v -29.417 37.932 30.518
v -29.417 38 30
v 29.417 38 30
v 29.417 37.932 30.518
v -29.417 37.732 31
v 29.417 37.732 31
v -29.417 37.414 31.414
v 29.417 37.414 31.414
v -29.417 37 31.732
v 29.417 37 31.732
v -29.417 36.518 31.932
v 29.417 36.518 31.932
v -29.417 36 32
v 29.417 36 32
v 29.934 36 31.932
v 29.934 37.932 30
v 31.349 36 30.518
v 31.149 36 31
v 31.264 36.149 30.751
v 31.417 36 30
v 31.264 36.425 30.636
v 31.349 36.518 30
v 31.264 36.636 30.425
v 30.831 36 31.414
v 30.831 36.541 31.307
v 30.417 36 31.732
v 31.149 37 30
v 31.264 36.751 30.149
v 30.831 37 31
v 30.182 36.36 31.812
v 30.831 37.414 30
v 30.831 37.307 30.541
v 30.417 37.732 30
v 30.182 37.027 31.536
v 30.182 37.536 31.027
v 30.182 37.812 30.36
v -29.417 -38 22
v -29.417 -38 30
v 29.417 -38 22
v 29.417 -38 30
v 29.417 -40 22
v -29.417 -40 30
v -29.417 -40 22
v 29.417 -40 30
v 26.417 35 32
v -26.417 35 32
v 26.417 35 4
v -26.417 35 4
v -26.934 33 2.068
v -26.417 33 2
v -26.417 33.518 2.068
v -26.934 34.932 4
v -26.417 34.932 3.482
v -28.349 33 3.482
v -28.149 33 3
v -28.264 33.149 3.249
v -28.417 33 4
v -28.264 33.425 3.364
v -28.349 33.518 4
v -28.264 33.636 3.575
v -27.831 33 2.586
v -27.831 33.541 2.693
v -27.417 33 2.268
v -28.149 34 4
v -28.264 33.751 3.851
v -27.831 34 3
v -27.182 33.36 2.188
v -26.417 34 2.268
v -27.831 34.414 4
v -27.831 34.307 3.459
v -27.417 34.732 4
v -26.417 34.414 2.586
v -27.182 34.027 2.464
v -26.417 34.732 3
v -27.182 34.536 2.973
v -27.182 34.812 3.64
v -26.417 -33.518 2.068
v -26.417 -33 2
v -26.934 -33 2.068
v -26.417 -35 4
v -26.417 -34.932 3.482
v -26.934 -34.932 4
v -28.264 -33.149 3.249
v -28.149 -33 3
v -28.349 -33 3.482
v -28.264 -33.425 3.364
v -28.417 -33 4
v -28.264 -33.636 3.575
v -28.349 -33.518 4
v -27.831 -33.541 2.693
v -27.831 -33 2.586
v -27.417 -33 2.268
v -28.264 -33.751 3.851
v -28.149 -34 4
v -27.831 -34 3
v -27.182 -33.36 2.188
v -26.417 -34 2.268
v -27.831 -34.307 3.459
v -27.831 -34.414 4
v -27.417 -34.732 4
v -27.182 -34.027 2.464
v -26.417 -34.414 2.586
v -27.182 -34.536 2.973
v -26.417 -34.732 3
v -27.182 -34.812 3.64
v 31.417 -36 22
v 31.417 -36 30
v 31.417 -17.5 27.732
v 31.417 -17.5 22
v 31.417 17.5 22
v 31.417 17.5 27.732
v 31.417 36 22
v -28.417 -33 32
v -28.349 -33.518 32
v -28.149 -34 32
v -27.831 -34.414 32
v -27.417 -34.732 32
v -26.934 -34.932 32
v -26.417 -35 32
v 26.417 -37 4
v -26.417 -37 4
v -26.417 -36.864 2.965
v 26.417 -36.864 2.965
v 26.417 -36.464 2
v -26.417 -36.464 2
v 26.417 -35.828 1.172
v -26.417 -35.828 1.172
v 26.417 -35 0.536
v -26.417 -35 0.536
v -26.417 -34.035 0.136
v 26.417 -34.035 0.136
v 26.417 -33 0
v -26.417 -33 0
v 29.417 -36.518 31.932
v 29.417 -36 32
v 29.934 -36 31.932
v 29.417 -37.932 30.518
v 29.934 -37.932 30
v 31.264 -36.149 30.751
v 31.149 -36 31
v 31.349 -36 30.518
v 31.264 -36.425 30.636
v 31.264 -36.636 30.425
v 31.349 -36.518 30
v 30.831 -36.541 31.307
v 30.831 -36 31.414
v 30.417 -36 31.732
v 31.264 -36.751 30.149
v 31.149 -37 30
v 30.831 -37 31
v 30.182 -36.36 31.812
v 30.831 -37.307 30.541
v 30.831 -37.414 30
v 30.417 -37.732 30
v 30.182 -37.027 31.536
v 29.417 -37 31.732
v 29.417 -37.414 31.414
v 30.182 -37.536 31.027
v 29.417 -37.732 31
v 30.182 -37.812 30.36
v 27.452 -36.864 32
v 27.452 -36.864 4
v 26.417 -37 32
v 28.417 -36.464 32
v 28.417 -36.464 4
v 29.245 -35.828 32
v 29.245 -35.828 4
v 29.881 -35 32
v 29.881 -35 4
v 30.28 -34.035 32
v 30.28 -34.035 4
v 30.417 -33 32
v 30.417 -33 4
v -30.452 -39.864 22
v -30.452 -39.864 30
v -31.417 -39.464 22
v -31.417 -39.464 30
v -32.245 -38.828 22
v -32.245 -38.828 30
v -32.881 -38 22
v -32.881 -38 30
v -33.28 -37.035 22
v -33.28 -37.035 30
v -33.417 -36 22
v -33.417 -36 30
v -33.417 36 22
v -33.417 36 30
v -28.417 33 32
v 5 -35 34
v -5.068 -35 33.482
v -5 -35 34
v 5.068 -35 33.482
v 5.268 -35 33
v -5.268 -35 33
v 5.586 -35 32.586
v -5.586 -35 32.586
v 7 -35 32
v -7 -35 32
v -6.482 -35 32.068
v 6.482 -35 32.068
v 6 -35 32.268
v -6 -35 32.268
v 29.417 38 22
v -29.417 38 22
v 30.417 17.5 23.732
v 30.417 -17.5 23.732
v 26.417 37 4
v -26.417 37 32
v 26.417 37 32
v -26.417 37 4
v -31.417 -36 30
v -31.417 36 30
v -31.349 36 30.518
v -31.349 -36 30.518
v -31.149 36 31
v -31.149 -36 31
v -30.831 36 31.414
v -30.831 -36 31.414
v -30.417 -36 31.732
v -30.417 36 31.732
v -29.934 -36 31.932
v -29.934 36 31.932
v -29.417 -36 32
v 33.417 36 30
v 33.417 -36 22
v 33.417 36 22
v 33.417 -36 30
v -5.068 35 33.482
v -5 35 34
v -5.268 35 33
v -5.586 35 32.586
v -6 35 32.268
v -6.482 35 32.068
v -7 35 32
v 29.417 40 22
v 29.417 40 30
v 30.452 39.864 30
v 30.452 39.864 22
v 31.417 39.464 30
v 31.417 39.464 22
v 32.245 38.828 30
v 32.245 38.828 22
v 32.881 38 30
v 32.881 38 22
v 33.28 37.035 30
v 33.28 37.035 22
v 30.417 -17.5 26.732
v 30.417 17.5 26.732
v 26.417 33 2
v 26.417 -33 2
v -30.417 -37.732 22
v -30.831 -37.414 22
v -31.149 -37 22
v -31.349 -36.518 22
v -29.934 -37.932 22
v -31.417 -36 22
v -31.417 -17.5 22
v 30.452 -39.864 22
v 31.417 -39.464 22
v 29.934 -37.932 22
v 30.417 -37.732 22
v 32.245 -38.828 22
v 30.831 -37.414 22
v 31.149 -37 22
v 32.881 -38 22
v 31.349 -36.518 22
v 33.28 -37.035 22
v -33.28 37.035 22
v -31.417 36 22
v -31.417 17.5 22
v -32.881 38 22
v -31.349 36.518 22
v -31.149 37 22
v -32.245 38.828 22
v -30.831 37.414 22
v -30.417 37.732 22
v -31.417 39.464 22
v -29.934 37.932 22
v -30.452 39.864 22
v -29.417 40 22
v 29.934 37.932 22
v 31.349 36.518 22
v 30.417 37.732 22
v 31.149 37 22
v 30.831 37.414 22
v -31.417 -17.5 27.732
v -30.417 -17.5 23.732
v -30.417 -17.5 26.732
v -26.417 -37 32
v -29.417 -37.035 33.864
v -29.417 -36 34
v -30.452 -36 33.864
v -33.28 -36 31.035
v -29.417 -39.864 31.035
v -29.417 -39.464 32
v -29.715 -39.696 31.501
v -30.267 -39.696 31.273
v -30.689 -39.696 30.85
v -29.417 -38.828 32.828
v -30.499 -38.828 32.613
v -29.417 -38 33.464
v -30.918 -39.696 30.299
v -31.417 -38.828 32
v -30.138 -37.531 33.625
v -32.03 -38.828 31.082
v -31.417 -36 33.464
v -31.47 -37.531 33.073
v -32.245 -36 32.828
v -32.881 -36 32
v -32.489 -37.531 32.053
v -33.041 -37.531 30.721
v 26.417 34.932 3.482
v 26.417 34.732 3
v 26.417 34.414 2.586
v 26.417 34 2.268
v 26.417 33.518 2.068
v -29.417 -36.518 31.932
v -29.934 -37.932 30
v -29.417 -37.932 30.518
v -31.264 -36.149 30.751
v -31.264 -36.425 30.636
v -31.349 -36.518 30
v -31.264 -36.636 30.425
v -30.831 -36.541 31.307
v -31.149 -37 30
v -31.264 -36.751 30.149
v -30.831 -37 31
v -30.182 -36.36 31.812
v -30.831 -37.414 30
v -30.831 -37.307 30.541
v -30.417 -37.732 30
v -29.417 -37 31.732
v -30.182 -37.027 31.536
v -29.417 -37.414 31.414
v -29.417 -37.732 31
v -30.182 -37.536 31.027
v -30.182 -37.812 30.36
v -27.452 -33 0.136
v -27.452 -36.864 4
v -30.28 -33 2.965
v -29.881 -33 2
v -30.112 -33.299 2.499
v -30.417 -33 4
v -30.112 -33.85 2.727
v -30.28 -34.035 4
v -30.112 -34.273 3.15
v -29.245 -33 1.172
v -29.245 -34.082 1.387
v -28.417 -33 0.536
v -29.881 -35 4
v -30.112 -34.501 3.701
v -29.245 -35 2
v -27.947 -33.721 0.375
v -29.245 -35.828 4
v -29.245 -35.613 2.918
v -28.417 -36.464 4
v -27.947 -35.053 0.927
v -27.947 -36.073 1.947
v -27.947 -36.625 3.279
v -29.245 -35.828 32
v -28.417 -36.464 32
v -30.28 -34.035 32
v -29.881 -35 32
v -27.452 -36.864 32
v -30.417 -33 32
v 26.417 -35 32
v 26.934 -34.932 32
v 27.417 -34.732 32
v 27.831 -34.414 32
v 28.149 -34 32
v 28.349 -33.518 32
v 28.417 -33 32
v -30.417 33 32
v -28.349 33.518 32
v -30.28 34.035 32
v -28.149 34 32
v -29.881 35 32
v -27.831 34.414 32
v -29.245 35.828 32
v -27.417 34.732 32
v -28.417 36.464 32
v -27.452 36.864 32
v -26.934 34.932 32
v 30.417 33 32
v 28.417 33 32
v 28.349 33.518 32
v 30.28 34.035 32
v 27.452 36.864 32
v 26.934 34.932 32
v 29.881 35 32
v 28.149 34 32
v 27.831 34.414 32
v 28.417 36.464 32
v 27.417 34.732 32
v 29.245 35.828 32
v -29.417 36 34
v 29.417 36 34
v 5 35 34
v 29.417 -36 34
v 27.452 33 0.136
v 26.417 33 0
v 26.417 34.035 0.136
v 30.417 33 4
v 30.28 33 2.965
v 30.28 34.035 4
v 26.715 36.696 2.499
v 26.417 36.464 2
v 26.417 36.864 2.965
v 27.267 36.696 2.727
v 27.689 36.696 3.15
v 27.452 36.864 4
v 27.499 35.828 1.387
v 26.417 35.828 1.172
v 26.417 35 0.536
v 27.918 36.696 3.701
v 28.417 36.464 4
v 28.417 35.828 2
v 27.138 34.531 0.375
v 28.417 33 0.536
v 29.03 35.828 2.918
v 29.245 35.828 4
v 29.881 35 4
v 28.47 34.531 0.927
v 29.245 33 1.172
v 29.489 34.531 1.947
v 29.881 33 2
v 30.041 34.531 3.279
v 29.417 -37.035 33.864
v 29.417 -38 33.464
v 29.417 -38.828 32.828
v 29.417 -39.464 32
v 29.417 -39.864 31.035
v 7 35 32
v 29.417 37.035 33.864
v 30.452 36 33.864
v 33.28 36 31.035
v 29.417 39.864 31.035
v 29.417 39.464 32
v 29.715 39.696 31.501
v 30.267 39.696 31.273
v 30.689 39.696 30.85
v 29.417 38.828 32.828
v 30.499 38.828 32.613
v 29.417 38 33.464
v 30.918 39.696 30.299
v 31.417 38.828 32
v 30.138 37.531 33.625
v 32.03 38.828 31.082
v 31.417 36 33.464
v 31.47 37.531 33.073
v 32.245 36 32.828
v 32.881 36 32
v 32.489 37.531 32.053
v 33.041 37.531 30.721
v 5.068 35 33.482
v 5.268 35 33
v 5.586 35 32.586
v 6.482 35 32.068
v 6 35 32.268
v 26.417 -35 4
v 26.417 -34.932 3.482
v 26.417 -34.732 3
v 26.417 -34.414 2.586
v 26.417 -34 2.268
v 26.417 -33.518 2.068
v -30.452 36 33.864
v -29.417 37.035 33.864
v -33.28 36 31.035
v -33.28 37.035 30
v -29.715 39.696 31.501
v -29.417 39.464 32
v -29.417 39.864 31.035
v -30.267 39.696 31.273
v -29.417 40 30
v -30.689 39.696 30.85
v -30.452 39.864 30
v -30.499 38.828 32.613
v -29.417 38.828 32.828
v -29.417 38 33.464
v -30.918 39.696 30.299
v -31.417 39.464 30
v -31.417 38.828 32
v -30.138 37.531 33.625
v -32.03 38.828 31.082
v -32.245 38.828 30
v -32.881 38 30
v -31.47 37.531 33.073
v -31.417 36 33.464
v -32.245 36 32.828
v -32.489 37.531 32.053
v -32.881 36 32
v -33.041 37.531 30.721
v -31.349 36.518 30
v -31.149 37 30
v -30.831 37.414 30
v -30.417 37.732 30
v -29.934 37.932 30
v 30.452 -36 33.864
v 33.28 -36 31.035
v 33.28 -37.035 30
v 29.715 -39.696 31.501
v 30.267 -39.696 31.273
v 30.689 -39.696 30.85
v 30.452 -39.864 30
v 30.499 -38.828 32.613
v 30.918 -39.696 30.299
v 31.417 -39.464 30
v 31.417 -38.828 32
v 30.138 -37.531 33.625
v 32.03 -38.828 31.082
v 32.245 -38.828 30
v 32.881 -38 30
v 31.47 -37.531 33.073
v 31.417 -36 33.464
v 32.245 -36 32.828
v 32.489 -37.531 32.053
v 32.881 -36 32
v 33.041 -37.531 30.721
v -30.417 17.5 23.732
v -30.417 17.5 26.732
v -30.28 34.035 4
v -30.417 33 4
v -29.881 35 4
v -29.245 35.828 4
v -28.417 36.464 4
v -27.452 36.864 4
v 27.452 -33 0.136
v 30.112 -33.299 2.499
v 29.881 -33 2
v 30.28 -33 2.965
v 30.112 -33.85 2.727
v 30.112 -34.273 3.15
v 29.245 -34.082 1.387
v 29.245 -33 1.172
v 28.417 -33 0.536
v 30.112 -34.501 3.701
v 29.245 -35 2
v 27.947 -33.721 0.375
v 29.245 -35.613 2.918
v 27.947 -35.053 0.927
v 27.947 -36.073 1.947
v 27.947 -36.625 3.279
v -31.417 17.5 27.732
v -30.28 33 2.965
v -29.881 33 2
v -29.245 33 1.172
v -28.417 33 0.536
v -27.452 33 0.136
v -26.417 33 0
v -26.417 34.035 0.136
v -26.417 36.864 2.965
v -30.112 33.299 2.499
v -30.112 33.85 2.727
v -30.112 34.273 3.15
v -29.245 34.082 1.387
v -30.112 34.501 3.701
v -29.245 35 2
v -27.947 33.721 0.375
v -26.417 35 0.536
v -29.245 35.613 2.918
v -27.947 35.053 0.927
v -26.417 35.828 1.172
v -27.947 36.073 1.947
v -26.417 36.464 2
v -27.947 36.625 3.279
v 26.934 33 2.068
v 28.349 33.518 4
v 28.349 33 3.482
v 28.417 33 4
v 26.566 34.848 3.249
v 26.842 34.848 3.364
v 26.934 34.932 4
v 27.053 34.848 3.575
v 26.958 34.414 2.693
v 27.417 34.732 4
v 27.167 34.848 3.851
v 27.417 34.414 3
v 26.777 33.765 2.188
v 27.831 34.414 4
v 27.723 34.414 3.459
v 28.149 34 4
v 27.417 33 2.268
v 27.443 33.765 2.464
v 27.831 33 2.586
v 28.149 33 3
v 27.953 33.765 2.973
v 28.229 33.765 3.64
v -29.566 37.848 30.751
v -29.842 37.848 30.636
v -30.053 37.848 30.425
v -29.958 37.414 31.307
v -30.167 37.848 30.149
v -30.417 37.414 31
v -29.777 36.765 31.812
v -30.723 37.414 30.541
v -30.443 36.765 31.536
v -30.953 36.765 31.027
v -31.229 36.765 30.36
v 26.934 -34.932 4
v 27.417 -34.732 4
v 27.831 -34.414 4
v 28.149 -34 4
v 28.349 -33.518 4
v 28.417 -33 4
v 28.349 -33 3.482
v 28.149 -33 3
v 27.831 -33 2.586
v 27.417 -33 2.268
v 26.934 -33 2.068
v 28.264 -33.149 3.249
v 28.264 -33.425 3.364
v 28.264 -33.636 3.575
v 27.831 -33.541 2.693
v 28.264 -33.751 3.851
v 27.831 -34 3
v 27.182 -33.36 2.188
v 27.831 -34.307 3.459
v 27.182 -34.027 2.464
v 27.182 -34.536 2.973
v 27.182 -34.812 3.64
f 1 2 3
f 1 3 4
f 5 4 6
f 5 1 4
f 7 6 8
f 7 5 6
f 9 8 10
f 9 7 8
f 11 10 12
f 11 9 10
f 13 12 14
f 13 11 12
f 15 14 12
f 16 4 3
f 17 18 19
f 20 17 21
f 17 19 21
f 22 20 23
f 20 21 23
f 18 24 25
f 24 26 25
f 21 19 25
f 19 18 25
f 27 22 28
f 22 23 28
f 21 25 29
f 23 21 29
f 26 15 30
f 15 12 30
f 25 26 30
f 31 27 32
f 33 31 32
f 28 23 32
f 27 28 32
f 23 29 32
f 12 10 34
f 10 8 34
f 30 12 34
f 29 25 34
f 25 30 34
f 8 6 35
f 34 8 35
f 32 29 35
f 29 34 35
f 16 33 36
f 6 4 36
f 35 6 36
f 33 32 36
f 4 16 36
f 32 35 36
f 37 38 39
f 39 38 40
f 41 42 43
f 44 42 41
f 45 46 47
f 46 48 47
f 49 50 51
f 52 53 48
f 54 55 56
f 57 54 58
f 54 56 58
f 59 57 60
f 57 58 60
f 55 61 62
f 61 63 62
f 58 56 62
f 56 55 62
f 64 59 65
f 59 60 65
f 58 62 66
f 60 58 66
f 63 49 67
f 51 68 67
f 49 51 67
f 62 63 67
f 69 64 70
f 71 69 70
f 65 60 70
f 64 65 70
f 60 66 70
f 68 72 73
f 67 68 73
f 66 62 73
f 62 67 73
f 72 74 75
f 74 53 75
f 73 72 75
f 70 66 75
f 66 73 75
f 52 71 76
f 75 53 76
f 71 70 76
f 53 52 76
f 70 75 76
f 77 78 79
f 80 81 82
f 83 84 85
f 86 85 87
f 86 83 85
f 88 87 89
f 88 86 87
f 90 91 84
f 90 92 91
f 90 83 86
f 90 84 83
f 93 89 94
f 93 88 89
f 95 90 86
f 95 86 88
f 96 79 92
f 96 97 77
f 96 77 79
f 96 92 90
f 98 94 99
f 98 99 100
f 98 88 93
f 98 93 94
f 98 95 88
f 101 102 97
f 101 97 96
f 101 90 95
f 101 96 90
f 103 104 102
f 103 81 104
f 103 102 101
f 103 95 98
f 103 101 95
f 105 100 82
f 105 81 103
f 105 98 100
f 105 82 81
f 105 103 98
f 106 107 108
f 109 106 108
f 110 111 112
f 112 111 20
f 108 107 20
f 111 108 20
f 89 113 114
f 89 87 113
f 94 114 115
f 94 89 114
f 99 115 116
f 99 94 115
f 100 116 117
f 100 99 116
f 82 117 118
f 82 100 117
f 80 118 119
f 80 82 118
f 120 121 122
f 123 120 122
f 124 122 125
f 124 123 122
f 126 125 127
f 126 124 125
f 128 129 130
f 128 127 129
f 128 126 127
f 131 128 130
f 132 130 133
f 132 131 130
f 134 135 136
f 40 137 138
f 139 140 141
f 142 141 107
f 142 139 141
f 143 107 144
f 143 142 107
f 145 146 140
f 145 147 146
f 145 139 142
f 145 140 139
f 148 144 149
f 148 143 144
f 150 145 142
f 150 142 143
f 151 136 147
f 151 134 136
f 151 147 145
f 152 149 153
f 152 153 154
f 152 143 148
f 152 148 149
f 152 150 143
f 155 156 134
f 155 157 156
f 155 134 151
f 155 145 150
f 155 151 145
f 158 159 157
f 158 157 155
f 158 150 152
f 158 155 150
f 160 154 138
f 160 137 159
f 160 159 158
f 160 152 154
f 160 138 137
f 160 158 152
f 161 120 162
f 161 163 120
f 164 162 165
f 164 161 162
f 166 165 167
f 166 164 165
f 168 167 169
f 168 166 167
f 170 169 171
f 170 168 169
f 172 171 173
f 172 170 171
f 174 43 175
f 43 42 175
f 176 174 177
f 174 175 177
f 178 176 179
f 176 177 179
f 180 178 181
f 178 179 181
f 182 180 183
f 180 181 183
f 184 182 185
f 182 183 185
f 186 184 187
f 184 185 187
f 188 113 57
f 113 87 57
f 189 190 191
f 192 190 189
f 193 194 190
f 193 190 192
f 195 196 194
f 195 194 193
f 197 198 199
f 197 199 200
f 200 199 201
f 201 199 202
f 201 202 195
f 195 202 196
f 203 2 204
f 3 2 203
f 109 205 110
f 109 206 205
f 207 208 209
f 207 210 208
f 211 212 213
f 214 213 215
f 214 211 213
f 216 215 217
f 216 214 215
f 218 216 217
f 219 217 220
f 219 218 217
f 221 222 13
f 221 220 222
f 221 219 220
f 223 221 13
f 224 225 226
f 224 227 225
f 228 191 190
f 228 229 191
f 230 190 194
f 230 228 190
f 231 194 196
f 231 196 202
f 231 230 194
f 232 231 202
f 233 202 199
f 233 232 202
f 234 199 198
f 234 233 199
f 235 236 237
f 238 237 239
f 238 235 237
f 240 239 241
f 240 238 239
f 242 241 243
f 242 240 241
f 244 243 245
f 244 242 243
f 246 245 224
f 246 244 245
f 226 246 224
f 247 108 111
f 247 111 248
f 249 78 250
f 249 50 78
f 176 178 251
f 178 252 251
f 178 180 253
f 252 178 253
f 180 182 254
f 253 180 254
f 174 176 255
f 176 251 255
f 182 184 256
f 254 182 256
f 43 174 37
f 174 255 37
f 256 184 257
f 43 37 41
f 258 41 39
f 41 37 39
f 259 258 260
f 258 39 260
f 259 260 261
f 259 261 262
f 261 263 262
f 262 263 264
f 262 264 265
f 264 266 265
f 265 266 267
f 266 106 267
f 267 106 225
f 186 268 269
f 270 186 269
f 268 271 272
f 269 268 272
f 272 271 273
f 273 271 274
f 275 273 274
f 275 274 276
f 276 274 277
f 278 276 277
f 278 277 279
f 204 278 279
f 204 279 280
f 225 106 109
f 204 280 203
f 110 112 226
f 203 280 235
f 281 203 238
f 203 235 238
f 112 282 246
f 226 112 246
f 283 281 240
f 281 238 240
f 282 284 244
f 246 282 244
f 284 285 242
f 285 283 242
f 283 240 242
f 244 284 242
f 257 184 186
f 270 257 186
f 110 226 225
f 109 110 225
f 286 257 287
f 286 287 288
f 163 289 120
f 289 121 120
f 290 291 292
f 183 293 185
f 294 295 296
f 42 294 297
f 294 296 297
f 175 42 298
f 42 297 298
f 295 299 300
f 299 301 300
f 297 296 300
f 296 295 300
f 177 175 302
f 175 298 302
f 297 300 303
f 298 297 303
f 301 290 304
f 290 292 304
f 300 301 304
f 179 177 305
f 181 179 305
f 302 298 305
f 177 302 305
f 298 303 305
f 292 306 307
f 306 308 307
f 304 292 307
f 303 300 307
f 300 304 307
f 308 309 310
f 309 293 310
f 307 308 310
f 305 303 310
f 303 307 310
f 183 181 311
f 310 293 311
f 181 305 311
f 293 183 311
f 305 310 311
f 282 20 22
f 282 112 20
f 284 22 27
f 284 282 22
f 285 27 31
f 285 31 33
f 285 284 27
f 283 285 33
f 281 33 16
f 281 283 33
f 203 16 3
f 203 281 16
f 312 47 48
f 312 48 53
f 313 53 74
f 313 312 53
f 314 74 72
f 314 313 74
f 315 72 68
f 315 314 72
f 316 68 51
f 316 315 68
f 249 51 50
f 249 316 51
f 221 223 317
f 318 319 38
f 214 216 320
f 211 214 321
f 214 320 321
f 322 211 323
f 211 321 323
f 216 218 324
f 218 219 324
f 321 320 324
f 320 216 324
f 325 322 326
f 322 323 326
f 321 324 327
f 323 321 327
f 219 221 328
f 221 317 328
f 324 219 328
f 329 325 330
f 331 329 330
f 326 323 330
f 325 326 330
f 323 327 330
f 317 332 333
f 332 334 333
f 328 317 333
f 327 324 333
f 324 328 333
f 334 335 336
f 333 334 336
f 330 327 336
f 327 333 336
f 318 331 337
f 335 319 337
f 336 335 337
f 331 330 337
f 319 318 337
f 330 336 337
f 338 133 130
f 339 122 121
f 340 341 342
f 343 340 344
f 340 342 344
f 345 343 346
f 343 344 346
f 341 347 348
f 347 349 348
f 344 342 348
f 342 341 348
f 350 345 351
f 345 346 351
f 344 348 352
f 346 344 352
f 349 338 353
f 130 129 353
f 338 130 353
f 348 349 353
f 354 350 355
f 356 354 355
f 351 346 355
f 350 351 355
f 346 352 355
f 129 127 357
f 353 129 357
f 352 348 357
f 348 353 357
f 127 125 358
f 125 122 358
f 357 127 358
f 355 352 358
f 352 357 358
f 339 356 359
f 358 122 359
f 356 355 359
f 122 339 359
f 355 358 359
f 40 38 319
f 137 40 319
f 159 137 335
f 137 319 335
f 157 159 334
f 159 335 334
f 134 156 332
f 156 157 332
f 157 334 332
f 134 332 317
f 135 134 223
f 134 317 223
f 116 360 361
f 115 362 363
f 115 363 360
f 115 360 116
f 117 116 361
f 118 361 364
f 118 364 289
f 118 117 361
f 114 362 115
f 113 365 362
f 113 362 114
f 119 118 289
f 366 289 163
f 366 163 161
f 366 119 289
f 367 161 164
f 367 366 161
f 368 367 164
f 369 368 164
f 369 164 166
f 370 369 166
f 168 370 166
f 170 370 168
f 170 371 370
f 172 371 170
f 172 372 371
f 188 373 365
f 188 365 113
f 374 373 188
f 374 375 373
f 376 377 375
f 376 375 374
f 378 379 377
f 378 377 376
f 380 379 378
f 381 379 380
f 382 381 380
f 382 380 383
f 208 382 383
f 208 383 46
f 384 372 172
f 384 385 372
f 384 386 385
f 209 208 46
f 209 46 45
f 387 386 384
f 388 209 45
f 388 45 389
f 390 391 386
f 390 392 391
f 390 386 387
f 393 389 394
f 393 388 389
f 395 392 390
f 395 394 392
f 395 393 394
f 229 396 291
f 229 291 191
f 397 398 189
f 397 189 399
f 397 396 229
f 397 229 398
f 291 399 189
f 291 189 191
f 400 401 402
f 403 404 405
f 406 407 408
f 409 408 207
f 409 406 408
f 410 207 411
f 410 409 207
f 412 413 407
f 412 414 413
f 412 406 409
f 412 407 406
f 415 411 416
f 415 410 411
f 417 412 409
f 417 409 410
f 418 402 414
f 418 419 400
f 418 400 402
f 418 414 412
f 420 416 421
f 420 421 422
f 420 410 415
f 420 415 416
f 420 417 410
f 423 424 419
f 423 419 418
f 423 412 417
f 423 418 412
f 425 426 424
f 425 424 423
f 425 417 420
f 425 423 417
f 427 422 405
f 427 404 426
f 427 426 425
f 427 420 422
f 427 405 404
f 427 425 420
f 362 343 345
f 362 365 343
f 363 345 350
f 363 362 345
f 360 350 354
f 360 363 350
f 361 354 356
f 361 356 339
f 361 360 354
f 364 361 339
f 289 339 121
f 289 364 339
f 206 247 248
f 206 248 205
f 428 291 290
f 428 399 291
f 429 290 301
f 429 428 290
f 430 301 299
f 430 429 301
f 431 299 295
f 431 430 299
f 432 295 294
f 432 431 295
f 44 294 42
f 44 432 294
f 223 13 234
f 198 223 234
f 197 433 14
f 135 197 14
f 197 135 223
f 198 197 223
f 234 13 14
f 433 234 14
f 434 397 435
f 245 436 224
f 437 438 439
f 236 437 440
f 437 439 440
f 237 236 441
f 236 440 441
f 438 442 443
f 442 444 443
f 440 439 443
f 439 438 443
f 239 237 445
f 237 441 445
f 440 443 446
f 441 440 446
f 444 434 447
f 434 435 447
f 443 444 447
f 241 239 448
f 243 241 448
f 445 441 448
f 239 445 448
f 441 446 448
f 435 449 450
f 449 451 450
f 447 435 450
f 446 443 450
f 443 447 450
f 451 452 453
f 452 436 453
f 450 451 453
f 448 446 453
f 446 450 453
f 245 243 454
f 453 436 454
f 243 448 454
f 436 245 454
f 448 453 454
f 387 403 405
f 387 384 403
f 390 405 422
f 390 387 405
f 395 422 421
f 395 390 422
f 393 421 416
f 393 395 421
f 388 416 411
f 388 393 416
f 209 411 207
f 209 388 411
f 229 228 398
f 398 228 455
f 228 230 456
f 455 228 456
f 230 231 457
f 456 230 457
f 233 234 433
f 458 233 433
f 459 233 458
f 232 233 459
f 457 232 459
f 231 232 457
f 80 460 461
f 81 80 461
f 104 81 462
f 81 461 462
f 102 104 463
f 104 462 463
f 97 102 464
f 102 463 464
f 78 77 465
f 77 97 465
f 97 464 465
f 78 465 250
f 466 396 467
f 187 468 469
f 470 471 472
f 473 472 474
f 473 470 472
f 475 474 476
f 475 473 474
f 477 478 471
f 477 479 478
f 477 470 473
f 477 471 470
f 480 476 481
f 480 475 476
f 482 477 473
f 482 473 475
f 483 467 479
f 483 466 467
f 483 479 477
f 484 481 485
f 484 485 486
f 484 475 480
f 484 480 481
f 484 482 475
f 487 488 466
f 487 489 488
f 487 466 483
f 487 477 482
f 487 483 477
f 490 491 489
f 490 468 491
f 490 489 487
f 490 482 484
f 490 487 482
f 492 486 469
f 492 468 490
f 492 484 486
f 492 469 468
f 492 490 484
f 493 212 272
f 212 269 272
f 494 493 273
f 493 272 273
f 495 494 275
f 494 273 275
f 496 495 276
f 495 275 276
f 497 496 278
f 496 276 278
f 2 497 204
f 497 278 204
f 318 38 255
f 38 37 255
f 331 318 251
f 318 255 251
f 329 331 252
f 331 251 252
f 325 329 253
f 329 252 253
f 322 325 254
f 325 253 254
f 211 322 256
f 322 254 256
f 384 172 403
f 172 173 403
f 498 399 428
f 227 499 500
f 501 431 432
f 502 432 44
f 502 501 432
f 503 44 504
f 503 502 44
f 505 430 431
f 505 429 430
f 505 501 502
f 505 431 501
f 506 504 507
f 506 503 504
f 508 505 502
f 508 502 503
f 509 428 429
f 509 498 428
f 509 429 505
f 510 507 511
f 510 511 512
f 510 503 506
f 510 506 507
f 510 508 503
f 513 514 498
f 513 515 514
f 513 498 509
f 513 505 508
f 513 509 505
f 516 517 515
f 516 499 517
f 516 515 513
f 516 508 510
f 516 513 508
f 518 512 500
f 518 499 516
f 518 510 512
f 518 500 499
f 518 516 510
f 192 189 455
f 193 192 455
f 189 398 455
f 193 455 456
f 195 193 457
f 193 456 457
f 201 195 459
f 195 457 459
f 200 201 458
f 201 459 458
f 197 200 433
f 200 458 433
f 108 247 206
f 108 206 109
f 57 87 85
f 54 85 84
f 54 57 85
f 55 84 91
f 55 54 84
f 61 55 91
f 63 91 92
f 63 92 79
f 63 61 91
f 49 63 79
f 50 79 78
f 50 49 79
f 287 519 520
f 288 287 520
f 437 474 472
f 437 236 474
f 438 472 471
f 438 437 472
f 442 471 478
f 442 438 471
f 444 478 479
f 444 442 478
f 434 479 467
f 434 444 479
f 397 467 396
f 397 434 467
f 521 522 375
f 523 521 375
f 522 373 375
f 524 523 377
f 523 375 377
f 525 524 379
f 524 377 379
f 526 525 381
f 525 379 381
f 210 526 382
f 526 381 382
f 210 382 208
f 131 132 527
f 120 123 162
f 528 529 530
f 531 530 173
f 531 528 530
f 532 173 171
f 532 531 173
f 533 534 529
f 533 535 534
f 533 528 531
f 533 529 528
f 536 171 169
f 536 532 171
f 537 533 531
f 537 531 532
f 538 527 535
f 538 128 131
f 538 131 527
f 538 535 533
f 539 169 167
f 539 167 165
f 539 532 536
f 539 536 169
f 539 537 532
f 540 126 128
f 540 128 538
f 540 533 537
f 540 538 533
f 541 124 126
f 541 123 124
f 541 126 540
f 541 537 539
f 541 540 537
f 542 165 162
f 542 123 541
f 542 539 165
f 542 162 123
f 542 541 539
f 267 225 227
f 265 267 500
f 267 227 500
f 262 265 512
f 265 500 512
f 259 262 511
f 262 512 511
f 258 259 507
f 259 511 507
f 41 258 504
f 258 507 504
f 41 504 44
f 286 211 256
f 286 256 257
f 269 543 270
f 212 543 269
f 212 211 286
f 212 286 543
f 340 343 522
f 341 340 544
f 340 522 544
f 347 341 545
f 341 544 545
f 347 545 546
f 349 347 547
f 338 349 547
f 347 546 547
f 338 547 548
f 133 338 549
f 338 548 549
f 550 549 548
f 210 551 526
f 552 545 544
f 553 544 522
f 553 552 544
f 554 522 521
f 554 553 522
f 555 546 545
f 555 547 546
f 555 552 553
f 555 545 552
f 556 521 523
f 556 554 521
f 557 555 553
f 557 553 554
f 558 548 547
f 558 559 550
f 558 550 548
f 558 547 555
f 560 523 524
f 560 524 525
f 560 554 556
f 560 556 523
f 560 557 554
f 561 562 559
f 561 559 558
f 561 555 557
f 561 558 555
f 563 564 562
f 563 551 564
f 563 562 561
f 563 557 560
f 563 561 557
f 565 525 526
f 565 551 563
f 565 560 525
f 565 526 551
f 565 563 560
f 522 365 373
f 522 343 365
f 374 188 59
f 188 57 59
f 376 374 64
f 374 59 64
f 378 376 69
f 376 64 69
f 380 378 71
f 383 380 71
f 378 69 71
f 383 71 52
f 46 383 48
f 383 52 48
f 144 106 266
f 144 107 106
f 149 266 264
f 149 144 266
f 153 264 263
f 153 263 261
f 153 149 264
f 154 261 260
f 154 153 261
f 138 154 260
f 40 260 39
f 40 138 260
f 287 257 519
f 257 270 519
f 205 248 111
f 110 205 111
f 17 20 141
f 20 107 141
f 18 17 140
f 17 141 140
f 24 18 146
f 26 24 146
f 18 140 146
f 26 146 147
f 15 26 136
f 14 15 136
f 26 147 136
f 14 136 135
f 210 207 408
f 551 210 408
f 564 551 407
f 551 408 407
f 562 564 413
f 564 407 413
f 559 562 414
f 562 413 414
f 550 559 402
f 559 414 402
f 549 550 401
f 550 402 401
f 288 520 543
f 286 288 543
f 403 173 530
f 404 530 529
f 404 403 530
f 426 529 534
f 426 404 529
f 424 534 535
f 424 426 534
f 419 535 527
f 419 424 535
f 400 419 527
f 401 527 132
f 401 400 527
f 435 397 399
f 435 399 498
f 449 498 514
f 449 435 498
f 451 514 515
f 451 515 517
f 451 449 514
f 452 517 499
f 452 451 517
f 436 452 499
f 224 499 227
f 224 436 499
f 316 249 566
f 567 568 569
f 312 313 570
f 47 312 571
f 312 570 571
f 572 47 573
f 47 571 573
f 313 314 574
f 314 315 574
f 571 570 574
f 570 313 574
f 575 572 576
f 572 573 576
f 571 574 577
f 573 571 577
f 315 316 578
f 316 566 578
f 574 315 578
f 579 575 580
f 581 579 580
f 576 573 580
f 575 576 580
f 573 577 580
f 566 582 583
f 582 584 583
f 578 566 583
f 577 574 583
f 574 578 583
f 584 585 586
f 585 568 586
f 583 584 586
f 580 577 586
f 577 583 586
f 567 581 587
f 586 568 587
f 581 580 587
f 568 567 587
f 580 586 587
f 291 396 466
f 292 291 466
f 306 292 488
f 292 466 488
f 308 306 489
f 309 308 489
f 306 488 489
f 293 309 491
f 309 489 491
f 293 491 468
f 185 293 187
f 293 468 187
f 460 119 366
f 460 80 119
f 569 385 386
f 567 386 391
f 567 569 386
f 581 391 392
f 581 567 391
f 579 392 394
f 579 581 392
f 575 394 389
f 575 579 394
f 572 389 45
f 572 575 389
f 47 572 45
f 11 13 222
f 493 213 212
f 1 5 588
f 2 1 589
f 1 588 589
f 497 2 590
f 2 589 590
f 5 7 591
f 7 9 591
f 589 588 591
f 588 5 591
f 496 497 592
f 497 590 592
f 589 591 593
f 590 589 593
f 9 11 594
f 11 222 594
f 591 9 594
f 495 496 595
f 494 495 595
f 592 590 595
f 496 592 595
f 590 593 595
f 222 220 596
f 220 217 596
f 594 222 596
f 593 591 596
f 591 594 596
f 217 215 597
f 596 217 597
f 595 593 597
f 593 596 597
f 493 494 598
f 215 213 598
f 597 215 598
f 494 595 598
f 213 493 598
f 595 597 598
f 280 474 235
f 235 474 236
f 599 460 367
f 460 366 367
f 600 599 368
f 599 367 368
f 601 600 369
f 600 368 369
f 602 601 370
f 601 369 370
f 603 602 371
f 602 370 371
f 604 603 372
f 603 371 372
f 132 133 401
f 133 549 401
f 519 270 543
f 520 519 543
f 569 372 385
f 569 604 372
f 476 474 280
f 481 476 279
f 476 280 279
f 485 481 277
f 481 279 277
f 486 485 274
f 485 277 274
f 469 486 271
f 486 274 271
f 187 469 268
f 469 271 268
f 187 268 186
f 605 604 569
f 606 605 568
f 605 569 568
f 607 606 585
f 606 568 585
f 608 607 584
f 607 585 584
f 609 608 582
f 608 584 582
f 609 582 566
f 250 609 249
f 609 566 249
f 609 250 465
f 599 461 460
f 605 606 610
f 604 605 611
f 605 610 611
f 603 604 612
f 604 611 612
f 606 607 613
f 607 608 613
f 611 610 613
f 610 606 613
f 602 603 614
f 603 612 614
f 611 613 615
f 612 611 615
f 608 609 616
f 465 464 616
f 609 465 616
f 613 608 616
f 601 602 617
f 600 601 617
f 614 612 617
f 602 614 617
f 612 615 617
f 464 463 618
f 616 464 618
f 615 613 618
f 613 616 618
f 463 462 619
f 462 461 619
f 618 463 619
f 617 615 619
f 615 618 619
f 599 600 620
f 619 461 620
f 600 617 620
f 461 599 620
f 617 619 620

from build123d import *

# Parameters (mm, degrees)
F3_W          = 60.8333333333
F3_H          = 74
F4_DEPTH      = 32
F5_T          = -2
F6_R          = 2
F7_R          = 4
F8_W          = 66.8333333333
F8_H          = 80
F9_DEPTH      = 2
F9_DEPTH_BACK = 10
F10_T         = -2
F11_W         = 10
F11_H         = 70
F12_DEPTH     = 2.001
F14_DEPTH     = 17.5
F15_R         = 1.99999
F16_R         = 4


# Not quite as in the source:
# - a fillet or chamfer is up to 0.001 mm smaller than in the source, because OpenCascade refuses the exact size


with BuildPart() as f4:
    # F3 (on Top) → F4 (new body, through all)
    with BuildSketch(Plane.XY):
        Rectangle(F3_W, F3_H)
    extrude(amount=F4_DEPTH)

    # F5
    f5_openings = [f4.faces().sort_by_distance(p)[0] for p in [
        (0, 0, 32),
    ]]
    offset(amount=F5_T, openings=f5_openings)

    # F6
    f6_edges = [f4.edges().sort_by_distance(p)[0] for p in [
        (0, -35, 2),
        (28.416667, 0, 2),
        (0, 35, 2),
        (-28.416667, 0, 2),
        (28.416667, -35, 17),
        (28.416667, 35, 17),
        (-28.416667, 35, 17),
        (-28.416667, -35, 17),
    ]]
    fillet(f6_edges, radius=F6_R)

    # F7
    f7_edges = [f4.edges().sort_by_distance(p)[0] for p in [
        (0, -37, 0),
        (30.416667, 0, 0),
        (0, 37, 0),
        (-30.416667, 0, 0),
        (30.416667, -37, 16),
        (30.416667, 37, 16),
        (-30.416667, -37, 16),
        (-30.416667, 37, 16),
    ]]
    fillet(f7_edges, radius=F7_R)


with BuildPart() as f9:
    # F8 (on offset) → F9 (new body, two sides)
    with BuildSketch(Plane.XY.offset(32)) as f9_sk:
        Rectangle(F8_W, F8_H)
    extrude(amount=F9_DEPTH)
    extrude(f9_sk.sketch, amount=-F9_DEPTH_BACK)

    # F10
    f10_openings = [f9.faces().sort_by_distance(p)[0] for p in [
        (0, 0, 22),
    ]]
    offset(amount=F10_T, openings=f10_openings)

    # F11 (on offset) → F12 (cut, through all)
    with BuildSketch(Plane.XY.offset(32)):
        Rectangle(F11_W, F11_H)
    extrude(amount=F12_DEPTH, mode=Mode.SUBTRACT)

    # F13 (on Front) → F14 (join, symmetric)
    with BuildSketch(Plane.XZ):
        Polygon((-30.4166666667, 26.7320508076), (-31.4166666667, 27.7320508076), (-31.4166666667, 22), (-30.4166666667, 23.7320508076), align=None)
        Polygon((31.4166666667, 22), (31.4166666667, 27.7320508076), (30.4166666667, 26.7320508076), (30.4166666667, 23.7320508076), align=None)
    extrude(amount=F14_DEPTH, both=True)

    # F15 (radius 2 in the source; OpenCascade refuses exactly that, so slightly less here)
    f15_edges = [f9.edges().sort_by_distance(p)[0] for p in [
        (0, -38, 32),
        (-31.416667, 0, 32),
        (0, 38, 32),
        (31.416667, 0, 32),
        (5, 0, 32),
        (-5, 0, 32),
        (-31.416667, -38, 27),
        (31.416667, -38, 27),
        (31.416667, 38, 27),
        (-31.416667, 38, 27),
    ]]
    fillet(f15_edges, radius=F15_R)

    # F16
    f16_edges = [f9.edges().sort_by_distance(p)[0] for p in [
        (33.416667, 0, 34),
        (-33.416667, 0, 34),
        (0, 40, 34),
        (0, -40, 34),
        (33.416667, -40, 28),
        (33.416667, 40, 28),
        (-33.416667, 40, 28),
        (-33.416667, -40, 28),
    ]]
    fillet(f16_edges, radius=F16_R)


solid = Compound([f4.part, f9.part])
